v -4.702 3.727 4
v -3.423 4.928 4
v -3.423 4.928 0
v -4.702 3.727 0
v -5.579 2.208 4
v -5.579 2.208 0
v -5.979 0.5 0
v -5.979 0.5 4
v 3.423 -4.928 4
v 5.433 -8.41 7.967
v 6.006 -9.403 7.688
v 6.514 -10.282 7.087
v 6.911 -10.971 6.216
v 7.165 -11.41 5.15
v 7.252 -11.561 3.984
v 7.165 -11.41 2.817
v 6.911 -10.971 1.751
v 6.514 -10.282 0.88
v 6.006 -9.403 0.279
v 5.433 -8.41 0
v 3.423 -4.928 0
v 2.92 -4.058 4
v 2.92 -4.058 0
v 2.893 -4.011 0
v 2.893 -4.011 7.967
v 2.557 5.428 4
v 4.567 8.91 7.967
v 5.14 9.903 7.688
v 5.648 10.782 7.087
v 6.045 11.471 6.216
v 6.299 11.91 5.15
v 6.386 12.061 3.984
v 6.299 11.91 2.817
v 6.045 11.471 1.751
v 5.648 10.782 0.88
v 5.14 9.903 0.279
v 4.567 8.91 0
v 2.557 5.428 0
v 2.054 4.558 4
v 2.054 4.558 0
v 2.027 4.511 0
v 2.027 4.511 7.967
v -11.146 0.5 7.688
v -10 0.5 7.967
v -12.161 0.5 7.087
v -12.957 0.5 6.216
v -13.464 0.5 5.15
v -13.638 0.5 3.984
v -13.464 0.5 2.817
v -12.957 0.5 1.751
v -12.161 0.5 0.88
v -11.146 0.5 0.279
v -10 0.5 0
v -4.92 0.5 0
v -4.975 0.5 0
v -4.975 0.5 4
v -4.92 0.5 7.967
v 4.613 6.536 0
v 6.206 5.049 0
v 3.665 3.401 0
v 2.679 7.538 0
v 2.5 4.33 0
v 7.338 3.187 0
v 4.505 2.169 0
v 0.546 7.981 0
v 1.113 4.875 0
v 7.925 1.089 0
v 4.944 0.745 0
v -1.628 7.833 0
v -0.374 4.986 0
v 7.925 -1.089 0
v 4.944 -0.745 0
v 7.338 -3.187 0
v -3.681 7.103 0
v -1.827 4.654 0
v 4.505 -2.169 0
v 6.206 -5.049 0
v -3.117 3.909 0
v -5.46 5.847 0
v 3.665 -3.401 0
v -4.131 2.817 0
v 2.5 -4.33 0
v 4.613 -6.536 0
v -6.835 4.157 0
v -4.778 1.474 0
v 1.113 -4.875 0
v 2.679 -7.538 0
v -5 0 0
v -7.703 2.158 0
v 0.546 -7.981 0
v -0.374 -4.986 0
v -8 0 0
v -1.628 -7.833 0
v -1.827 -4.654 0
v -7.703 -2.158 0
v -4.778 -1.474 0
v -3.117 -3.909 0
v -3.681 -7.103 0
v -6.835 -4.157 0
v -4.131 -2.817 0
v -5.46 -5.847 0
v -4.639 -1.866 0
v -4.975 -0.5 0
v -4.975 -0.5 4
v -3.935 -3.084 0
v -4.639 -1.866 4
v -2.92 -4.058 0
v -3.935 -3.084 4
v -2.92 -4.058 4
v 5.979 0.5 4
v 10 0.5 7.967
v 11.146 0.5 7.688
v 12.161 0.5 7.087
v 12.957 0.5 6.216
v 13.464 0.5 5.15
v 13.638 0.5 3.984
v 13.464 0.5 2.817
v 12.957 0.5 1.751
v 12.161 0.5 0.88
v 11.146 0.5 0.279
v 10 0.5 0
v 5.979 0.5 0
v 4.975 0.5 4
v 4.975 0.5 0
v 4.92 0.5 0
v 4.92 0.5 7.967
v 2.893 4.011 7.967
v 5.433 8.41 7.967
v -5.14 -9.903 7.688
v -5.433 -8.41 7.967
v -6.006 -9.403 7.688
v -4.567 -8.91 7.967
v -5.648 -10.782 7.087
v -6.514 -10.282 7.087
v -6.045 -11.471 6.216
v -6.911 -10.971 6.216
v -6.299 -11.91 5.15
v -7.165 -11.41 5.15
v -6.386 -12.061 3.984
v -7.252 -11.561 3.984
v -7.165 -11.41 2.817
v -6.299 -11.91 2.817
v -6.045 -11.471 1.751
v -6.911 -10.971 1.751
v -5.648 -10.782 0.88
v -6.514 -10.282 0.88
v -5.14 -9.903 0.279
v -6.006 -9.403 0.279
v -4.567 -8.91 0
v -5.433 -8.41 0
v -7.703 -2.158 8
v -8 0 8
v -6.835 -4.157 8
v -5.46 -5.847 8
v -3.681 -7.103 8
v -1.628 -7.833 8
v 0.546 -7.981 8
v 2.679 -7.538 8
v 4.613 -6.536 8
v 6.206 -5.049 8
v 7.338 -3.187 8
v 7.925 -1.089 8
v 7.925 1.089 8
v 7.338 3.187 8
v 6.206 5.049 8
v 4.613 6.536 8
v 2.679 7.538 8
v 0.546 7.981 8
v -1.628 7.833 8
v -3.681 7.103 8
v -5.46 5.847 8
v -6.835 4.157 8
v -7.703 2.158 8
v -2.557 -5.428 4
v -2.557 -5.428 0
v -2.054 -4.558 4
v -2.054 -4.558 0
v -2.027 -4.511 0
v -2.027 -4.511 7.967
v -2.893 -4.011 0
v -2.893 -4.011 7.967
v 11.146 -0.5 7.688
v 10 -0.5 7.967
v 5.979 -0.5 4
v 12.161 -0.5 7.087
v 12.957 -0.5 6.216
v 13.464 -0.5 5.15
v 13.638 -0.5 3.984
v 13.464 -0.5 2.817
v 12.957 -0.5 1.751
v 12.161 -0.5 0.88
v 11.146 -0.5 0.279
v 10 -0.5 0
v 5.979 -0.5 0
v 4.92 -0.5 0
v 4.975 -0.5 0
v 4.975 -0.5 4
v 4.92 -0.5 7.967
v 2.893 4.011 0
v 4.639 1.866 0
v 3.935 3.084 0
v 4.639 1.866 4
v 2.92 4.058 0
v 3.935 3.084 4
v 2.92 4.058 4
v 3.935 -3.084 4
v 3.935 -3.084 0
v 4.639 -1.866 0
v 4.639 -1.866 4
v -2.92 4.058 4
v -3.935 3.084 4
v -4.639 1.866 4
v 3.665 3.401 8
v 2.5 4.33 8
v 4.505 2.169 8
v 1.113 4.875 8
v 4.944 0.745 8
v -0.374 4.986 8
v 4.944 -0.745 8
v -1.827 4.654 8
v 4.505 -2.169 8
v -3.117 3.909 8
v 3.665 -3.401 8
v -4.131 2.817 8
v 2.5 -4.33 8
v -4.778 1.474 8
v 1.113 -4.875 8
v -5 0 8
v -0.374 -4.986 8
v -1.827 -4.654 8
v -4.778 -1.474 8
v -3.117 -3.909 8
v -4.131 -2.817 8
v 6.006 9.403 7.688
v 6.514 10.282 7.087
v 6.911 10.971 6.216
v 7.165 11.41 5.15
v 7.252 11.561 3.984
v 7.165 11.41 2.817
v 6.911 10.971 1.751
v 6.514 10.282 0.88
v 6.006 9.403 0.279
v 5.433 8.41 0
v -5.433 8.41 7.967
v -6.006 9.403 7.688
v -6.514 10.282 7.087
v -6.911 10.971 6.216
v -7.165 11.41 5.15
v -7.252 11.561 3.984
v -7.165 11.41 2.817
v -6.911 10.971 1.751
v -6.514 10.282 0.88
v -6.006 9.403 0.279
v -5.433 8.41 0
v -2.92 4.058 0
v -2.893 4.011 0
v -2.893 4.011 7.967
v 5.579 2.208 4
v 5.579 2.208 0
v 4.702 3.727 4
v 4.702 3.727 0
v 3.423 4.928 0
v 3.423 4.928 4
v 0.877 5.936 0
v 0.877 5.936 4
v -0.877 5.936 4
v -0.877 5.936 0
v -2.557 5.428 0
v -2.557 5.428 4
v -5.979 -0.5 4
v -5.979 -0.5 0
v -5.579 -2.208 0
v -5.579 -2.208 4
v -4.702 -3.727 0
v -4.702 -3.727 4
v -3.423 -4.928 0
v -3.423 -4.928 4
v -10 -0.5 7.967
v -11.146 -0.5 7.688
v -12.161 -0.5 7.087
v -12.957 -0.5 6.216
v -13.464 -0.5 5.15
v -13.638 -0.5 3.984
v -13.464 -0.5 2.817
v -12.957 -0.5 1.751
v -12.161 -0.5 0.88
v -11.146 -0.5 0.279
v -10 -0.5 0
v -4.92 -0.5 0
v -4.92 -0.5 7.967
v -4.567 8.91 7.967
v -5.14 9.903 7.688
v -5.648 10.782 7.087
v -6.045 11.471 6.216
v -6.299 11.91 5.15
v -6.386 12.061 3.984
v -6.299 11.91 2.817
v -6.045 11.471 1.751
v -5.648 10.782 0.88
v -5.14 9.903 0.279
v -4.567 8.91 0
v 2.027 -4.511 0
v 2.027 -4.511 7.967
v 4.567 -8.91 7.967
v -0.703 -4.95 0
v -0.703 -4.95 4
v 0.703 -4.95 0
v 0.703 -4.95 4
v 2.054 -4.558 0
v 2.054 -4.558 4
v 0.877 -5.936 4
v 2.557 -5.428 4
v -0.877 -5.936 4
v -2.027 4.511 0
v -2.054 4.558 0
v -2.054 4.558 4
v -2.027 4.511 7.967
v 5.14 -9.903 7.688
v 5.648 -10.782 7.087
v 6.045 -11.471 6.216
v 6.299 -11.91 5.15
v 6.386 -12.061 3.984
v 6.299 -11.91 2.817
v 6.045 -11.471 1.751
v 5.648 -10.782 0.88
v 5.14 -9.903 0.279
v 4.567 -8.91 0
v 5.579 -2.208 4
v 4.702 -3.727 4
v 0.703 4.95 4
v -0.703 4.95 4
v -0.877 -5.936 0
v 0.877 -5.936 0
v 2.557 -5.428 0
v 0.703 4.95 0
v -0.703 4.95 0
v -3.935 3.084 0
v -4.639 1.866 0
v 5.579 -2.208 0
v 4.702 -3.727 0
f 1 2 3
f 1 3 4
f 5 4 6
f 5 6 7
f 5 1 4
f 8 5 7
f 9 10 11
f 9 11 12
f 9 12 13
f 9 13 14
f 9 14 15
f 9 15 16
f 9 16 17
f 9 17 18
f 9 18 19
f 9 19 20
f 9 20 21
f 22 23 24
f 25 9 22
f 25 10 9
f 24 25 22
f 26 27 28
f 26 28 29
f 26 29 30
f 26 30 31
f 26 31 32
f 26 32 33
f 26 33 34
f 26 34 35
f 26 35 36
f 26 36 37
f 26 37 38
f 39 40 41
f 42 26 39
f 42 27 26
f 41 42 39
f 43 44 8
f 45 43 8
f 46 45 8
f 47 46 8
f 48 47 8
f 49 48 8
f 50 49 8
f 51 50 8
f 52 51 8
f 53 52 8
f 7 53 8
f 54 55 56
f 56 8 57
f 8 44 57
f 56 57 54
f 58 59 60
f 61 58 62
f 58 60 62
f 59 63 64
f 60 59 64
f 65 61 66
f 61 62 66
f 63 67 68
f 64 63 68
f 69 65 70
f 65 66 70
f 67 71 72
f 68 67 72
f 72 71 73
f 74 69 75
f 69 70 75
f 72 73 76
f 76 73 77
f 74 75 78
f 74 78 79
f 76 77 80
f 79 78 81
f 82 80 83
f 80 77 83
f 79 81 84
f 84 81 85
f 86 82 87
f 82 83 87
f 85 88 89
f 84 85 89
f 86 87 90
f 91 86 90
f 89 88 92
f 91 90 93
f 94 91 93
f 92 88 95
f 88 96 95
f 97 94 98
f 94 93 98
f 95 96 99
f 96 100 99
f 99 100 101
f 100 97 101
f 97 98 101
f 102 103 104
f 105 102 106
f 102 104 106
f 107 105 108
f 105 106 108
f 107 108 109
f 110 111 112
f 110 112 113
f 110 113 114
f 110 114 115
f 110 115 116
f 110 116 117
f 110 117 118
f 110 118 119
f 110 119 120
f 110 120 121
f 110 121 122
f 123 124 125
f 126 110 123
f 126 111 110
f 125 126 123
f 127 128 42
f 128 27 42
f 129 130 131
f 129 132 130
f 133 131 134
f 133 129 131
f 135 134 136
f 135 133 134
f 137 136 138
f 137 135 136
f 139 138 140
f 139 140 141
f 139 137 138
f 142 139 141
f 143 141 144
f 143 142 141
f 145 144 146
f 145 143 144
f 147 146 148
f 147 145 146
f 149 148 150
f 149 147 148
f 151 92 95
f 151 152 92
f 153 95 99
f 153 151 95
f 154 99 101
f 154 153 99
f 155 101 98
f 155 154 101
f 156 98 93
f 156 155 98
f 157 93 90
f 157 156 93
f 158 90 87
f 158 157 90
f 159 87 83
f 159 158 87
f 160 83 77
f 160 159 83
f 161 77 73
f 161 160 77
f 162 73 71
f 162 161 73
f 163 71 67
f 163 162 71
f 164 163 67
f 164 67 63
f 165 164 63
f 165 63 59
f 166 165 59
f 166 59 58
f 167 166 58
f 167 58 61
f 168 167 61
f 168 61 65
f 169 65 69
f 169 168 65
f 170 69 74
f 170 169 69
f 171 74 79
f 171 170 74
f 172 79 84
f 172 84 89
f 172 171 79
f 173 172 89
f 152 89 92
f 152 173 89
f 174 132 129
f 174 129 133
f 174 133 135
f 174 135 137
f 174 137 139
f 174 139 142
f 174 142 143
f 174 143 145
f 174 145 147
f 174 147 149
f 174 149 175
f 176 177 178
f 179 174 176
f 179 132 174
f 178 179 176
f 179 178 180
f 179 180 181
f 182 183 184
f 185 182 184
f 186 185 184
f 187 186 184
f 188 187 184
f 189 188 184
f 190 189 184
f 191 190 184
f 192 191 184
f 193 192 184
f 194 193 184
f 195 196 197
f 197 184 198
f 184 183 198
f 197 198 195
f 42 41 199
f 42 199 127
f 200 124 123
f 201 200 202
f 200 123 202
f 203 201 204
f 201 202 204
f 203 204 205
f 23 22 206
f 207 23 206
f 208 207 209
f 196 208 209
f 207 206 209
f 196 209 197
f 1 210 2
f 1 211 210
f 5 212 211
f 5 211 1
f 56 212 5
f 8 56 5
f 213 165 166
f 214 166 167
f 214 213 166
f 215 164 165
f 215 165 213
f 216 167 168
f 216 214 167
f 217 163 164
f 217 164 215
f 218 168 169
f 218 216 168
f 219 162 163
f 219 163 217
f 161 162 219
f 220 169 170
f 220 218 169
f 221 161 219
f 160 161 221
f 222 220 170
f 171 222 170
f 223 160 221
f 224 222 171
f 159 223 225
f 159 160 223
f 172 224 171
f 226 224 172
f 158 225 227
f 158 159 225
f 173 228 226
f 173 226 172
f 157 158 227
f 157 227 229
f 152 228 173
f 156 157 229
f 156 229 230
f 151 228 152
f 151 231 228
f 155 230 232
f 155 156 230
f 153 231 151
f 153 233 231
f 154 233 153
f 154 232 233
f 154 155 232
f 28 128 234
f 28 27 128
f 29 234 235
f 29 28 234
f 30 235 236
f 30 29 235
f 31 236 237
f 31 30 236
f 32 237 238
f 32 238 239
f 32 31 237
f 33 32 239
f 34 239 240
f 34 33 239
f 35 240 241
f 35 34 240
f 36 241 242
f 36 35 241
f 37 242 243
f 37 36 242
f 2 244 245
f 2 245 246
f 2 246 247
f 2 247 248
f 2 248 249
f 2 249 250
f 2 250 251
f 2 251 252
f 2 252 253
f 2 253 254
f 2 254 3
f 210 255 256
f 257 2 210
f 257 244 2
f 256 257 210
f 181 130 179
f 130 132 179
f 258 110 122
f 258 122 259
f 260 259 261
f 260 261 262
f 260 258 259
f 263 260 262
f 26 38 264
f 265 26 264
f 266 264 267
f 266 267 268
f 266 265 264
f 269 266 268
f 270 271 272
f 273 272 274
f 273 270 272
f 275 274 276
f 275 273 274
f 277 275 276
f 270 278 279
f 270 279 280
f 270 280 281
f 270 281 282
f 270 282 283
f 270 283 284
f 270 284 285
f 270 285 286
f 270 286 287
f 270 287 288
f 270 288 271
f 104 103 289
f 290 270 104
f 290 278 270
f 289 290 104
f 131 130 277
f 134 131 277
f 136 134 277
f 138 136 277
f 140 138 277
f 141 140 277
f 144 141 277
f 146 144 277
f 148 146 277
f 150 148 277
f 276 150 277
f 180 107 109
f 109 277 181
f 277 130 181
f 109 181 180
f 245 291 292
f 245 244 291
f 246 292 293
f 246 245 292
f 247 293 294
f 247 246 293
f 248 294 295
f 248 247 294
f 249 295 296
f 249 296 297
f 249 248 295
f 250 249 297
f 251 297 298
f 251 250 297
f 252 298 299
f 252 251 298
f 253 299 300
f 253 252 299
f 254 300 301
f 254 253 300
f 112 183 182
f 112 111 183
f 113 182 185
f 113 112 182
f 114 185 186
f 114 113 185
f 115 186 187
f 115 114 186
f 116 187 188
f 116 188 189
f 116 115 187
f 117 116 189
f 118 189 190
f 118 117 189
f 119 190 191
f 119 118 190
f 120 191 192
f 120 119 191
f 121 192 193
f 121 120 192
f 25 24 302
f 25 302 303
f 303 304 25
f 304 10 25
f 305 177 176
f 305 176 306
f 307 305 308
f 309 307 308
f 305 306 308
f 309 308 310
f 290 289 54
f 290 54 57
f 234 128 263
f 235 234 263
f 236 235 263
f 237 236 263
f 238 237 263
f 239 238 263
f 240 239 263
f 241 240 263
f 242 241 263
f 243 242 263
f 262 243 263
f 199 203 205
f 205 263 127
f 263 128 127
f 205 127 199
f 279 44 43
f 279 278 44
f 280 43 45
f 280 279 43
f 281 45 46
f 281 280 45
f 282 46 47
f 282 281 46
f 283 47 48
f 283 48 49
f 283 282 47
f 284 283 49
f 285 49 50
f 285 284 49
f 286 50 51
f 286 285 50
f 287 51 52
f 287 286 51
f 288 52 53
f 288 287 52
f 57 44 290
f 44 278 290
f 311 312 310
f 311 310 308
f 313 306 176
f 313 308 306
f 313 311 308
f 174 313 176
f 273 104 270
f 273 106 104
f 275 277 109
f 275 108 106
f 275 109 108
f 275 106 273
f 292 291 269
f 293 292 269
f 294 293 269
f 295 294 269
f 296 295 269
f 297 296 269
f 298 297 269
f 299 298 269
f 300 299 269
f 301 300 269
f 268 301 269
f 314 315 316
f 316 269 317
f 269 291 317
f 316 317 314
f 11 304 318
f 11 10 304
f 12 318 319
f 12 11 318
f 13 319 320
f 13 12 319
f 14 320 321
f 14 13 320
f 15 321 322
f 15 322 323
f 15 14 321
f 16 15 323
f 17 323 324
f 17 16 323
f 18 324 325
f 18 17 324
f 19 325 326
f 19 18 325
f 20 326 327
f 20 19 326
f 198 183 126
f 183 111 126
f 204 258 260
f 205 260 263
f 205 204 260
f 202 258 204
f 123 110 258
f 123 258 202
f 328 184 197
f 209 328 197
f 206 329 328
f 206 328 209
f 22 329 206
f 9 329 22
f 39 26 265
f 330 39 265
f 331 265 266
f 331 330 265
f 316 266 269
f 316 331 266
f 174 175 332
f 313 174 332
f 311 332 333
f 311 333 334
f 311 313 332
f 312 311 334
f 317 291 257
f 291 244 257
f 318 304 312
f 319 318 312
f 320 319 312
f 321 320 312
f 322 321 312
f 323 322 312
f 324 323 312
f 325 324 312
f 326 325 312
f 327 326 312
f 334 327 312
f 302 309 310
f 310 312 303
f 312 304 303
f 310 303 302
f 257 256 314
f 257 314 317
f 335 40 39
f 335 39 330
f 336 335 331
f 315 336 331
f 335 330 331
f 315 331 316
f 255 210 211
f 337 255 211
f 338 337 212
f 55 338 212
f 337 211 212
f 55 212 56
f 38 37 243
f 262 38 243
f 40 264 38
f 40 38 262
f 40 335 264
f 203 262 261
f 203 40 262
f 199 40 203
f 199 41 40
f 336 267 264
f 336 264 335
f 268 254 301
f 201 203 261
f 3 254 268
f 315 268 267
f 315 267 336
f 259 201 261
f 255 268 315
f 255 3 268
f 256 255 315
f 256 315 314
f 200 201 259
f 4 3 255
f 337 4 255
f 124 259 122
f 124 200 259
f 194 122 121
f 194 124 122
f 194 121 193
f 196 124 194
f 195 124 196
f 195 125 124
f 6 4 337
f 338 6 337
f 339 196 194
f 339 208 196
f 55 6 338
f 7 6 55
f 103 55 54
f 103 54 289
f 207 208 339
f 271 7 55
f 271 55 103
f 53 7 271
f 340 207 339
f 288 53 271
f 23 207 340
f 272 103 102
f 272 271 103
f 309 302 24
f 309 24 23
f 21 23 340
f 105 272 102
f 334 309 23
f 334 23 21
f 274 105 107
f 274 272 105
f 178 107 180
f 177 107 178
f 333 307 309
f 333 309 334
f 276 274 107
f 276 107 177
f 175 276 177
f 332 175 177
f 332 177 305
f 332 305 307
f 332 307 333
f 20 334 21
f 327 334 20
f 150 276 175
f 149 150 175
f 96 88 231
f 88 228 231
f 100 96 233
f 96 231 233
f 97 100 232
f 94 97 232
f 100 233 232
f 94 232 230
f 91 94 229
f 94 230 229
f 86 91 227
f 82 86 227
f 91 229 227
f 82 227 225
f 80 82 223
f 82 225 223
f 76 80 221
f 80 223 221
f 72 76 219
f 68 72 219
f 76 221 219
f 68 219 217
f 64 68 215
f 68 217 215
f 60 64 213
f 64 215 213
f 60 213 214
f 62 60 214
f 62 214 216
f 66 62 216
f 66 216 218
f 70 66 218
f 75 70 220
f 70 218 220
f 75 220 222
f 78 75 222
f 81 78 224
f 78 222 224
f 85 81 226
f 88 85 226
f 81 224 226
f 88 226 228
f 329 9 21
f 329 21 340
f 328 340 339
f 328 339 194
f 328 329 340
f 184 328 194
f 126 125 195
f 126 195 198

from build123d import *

# Parameters (mm, degrees)
F0_W            = 1
F0_H            = 4
F2_W            = 5.08
F2_H            = 7.9671185657
F3_DEPTH        = 0.5
F3_COPIES_COUNT = 6
F5_W            = 3
F5_H            = 8


# Not quite as in the source:
# - a pattern or mirror of a feature is missing from the dataset's text; its kind, count and spacing are read off the source's solid


with BuildPart() as f1:
    # F0 (on Front) → F1 (revolve)
    with BuildSketch(Plane.XZ):
        with Locations((-5.5, 2)):
            Rectangle(F0_W, F0_H)
    revolve(axis=Axis((0, 0, 19.3039998412), (0, 0, 1)))

    # F2 (on Front) → F3 (join, symmetric)
    with BuildSketch(Plane.XZ):
        with BuildLine():
            Line((-10, 0), (-10, 7.9671185657))
            ThreePointArc((-10, 7.9671185657), (-13.6377080735, 3.9835592829), (-10, 0))
        make_face()
        with Locations((-7.46, 3.9835592829)):
            Rectangle(F2_W, F2_H)
    f3 = extrude(amount=F3_DEPTH, both=True)

    # F3_copies: F3 ×6 about axis
    f3_copies_axis = Axis((0, 0, 0), (0, 0, 1))
    for i in range(1, F3_COPIES_COUNT):
        add(f3.rotate(f3_copies_axis, i * 360 / F3_COPIES_COUNT))


with BuildPart() as f6:
    # F5 (on Front) → F6 (revolve)
    with BuildSketch(Plane.XZ):
        with Locations((-6.5, 4)):
            Rectangle(F5_W, F5_H)
    revolve(axis=Axis((0, 0, 73.8201290369), (0, 0, 1)))


solid = Compound([f1.part, f6.part])
